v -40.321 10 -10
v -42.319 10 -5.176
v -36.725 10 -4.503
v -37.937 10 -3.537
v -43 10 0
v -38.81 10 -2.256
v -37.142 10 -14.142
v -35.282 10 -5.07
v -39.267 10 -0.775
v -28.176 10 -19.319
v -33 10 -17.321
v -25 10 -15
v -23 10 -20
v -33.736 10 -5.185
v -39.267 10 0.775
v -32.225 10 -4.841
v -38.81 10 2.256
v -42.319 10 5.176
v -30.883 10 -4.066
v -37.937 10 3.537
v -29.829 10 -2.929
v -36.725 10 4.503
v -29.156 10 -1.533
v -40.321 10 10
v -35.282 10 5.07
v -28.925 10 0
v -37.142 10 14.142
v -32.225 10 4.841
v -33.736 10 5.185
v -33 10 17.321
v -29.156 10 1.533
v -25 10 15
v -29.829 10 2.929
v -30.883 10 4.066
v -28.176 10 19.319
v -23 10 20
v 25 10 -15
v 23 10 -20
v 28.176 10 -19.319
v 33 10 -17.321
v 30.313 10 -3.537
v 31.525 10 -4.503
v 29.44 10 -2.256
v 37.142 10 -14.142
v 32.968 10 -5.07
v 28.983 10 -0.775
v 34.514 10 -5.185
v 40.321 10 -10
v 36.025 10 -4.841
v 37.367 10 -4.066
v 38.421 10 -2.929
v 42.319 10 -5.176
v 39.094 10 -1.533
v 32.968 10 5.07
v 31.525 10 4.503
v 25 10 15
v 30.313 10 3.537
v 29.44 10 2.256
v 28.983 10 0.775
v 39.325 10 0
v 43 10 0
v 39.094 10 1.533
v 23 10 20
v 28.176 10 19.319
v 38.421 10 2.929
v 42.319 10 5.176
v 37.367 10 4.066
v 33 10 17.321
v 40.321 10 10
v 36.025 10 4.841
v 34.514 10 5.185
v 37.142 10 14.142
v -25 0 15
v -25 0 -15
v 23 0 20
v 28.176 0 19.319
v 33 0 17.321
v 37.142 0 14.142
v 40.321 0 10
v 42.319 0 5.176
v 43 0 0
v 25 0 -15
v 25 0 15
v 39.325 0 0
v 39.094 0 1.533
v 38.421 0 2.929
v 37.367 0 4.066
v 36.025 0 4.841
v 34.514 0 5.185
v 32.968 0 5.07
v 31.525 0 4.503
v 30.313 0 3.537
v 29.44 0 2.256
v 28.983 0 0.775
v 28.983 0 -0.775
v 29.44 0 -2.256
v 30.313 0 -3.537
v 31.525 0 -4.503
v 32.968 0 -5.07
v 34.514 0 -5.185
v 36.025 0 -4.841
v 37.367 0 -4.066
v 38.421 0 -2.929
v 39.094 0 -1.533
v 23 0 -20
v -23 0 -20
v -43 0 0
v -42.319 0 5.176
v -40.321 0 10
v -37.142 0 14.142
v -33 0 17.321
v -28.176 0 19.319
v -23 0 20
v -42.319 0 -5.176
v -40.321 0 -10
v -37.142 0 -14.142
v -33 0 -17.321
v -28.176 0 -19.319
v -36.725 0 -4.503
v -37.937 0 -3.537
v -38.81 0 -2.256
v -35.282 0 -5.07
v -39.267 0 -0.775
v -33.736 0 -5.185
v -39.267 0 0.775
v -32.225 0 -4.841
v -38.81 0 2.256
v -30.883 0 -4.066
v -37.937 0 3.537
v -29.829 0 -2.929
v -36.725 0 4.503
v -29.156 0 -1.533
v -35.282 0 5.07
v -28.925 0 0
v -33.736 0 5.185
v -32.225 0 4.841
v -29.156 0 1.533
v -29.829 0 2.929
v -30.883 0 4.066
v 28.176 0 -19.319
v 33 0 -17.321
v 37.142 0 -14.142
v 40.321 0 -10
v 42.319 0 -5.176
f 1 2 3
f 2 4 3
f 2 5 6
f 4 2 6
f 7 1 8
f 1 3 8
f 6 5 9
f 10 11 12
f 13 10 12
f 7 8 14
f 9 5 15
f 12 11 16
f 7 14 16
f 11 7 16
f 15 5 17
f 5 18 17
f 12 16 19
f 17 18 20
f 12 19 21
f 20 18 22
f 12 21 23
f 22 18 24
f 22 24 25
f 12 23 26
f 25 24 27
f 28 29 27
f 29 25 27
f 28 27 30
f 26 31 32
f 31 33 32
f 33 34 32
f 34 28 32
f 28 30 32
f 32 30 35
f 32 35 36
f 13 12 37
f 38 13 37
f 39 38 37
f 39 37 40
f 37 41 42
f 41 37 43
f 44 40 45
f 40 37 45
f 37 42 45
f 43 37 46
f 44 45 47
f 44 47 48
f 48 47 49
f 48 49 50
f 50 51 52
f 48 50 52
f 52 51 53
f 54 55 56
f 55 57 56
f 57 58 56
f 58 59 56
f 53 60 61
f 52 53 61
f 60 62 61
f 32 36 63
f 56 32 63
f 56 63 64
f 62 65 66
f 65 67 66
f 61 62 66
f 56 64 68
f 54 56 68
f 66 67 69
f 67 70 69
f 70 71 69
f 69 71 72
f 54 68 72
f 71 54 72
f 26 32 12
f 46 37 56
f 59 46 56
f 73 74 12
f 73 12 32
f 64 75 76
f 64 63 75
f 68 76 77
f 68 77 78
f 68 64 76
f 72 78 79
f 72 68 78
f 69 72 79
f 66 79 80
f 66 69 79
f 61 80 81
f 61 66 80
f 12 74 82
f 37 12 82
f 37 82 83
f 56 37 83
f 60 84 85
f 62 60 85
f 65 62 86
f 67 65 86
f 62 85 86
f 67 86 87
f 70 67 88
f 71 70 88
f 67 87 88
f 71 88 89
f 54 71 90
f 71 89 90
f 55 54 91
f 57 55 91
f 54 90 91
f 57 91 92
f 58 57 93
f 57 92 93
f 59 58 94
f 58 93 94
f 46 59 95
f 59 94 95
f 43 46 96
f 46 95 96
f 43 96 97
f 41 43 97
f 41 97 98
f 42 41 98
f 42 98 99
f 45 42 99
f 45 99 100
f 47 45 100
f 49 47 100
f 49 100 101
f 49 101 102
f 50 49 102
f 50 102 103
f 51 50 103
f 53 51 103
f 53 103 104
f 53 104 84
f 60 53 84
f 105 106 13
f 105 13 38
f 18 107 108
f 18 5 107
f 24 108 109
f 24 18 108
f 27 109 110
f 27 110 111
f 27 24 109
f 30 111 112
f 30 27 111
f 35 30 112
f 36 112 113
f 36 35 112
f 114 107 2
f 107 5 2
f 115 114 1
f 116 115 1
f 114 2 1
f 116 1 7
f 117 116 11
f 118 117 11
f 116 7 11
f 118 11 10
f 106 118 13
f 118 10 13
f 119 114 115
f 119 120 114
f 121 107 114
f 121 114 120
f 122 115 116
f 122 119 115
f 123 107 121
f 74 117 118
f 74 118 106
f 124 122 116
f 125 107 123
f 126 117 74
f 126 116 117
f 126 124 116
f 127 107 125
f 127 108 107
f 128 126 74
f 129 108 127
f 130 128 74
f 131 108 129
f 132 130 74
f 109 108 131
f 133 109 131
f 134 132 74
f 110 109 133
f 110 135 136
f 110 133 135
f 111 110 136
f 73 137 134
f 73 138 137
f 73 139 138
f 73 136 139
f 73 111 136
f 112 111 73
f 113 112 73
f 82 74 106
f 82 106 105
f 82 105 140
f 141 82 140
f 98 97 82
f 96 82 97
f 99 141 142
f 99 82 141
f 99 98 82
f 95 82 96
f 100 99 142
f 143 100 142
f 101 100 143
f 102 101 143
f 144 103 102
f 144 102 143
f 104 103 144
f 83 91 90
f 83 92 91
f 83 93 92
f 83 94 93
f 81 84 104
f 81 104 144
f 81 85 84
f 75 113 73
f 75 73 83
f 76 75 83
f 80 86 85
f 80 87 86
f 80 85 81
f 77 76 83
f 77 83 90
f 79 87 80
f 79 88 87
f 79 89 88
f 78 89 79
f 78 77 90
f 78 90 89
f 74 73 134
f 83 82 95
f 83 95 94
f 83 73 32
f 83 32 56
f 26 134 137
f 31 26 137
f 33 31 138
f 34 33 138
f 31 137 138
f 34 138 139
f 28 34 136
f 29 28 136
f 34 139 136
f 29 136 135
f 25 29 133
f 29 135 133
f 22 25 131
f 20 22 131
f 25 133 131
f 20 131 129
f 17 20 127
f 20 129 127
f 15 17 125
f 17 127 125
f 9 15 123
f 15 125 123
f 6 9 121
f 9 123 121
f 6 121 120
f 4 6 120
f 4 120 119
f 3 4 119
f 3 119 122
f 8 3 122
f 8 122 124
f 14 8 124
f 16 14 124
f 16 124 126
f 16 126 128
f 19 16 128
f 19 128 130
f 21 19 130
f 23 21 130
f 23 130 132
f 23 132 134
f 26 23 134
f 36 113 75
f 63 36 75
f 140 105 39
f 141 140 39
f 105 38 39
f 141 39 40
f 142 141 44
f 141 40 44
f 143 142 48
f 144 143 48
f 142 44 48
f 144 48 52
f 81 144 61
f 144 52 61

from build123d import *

# Parameters (mm, degrees)
F0_W     = 86
F0_H     = 40
F1_DEPTH = 10
F2_R     = 5.2
F3_DEPTH = 25
F4_W     = 50
F4_H     = 30
F5_DEPTH = 25
F6_R     = 19.99999


# Not quite as in the source:
# - a fillet or chamfer is up to 0.001 mm smaller than in the source, because OpenCascade refuses the exact size


with BuildPart() as f1:
    # F0 (on Front) → F1 (new body)
    with BuildSketch(Plane.XZ):
        Rectangle(F0_W, F0_H)
    extrude(amount=-F1_DEPTH)

    # F2 (on face) → F3 (cut)
    with BuildSketch(Plane.XZ):
        with Locations((-34.125, 0)):
            Circle(F2_R)
        with Locations((34.125, 0)):
            Circle(F2_R)
    extrude(amount=-F3_DEPTH, mode=Mode.SUBTRACT)

    # F4 (on face) → F5 (cut)
    with BuildSketch(Plane.XZ):
        Rectangle(F4_W, F4_H)
    extrude(amount=-F5_DEPTH, mode=Mode.SUBTRACT)

    # F6 (radius 20 in the source; OpenCascade refuses exactly that, so slightly less here)
    f6_edges = [f1.edges().sort_by_distance(p)[0] for p in [
        (-43, 5, 20),
        (43, 5, 20),
        (43, 5, -20),
        (-43, 5, -20),
    ]]
    fillet(f6_edges, radius=F6_R)


solid = f1.part
